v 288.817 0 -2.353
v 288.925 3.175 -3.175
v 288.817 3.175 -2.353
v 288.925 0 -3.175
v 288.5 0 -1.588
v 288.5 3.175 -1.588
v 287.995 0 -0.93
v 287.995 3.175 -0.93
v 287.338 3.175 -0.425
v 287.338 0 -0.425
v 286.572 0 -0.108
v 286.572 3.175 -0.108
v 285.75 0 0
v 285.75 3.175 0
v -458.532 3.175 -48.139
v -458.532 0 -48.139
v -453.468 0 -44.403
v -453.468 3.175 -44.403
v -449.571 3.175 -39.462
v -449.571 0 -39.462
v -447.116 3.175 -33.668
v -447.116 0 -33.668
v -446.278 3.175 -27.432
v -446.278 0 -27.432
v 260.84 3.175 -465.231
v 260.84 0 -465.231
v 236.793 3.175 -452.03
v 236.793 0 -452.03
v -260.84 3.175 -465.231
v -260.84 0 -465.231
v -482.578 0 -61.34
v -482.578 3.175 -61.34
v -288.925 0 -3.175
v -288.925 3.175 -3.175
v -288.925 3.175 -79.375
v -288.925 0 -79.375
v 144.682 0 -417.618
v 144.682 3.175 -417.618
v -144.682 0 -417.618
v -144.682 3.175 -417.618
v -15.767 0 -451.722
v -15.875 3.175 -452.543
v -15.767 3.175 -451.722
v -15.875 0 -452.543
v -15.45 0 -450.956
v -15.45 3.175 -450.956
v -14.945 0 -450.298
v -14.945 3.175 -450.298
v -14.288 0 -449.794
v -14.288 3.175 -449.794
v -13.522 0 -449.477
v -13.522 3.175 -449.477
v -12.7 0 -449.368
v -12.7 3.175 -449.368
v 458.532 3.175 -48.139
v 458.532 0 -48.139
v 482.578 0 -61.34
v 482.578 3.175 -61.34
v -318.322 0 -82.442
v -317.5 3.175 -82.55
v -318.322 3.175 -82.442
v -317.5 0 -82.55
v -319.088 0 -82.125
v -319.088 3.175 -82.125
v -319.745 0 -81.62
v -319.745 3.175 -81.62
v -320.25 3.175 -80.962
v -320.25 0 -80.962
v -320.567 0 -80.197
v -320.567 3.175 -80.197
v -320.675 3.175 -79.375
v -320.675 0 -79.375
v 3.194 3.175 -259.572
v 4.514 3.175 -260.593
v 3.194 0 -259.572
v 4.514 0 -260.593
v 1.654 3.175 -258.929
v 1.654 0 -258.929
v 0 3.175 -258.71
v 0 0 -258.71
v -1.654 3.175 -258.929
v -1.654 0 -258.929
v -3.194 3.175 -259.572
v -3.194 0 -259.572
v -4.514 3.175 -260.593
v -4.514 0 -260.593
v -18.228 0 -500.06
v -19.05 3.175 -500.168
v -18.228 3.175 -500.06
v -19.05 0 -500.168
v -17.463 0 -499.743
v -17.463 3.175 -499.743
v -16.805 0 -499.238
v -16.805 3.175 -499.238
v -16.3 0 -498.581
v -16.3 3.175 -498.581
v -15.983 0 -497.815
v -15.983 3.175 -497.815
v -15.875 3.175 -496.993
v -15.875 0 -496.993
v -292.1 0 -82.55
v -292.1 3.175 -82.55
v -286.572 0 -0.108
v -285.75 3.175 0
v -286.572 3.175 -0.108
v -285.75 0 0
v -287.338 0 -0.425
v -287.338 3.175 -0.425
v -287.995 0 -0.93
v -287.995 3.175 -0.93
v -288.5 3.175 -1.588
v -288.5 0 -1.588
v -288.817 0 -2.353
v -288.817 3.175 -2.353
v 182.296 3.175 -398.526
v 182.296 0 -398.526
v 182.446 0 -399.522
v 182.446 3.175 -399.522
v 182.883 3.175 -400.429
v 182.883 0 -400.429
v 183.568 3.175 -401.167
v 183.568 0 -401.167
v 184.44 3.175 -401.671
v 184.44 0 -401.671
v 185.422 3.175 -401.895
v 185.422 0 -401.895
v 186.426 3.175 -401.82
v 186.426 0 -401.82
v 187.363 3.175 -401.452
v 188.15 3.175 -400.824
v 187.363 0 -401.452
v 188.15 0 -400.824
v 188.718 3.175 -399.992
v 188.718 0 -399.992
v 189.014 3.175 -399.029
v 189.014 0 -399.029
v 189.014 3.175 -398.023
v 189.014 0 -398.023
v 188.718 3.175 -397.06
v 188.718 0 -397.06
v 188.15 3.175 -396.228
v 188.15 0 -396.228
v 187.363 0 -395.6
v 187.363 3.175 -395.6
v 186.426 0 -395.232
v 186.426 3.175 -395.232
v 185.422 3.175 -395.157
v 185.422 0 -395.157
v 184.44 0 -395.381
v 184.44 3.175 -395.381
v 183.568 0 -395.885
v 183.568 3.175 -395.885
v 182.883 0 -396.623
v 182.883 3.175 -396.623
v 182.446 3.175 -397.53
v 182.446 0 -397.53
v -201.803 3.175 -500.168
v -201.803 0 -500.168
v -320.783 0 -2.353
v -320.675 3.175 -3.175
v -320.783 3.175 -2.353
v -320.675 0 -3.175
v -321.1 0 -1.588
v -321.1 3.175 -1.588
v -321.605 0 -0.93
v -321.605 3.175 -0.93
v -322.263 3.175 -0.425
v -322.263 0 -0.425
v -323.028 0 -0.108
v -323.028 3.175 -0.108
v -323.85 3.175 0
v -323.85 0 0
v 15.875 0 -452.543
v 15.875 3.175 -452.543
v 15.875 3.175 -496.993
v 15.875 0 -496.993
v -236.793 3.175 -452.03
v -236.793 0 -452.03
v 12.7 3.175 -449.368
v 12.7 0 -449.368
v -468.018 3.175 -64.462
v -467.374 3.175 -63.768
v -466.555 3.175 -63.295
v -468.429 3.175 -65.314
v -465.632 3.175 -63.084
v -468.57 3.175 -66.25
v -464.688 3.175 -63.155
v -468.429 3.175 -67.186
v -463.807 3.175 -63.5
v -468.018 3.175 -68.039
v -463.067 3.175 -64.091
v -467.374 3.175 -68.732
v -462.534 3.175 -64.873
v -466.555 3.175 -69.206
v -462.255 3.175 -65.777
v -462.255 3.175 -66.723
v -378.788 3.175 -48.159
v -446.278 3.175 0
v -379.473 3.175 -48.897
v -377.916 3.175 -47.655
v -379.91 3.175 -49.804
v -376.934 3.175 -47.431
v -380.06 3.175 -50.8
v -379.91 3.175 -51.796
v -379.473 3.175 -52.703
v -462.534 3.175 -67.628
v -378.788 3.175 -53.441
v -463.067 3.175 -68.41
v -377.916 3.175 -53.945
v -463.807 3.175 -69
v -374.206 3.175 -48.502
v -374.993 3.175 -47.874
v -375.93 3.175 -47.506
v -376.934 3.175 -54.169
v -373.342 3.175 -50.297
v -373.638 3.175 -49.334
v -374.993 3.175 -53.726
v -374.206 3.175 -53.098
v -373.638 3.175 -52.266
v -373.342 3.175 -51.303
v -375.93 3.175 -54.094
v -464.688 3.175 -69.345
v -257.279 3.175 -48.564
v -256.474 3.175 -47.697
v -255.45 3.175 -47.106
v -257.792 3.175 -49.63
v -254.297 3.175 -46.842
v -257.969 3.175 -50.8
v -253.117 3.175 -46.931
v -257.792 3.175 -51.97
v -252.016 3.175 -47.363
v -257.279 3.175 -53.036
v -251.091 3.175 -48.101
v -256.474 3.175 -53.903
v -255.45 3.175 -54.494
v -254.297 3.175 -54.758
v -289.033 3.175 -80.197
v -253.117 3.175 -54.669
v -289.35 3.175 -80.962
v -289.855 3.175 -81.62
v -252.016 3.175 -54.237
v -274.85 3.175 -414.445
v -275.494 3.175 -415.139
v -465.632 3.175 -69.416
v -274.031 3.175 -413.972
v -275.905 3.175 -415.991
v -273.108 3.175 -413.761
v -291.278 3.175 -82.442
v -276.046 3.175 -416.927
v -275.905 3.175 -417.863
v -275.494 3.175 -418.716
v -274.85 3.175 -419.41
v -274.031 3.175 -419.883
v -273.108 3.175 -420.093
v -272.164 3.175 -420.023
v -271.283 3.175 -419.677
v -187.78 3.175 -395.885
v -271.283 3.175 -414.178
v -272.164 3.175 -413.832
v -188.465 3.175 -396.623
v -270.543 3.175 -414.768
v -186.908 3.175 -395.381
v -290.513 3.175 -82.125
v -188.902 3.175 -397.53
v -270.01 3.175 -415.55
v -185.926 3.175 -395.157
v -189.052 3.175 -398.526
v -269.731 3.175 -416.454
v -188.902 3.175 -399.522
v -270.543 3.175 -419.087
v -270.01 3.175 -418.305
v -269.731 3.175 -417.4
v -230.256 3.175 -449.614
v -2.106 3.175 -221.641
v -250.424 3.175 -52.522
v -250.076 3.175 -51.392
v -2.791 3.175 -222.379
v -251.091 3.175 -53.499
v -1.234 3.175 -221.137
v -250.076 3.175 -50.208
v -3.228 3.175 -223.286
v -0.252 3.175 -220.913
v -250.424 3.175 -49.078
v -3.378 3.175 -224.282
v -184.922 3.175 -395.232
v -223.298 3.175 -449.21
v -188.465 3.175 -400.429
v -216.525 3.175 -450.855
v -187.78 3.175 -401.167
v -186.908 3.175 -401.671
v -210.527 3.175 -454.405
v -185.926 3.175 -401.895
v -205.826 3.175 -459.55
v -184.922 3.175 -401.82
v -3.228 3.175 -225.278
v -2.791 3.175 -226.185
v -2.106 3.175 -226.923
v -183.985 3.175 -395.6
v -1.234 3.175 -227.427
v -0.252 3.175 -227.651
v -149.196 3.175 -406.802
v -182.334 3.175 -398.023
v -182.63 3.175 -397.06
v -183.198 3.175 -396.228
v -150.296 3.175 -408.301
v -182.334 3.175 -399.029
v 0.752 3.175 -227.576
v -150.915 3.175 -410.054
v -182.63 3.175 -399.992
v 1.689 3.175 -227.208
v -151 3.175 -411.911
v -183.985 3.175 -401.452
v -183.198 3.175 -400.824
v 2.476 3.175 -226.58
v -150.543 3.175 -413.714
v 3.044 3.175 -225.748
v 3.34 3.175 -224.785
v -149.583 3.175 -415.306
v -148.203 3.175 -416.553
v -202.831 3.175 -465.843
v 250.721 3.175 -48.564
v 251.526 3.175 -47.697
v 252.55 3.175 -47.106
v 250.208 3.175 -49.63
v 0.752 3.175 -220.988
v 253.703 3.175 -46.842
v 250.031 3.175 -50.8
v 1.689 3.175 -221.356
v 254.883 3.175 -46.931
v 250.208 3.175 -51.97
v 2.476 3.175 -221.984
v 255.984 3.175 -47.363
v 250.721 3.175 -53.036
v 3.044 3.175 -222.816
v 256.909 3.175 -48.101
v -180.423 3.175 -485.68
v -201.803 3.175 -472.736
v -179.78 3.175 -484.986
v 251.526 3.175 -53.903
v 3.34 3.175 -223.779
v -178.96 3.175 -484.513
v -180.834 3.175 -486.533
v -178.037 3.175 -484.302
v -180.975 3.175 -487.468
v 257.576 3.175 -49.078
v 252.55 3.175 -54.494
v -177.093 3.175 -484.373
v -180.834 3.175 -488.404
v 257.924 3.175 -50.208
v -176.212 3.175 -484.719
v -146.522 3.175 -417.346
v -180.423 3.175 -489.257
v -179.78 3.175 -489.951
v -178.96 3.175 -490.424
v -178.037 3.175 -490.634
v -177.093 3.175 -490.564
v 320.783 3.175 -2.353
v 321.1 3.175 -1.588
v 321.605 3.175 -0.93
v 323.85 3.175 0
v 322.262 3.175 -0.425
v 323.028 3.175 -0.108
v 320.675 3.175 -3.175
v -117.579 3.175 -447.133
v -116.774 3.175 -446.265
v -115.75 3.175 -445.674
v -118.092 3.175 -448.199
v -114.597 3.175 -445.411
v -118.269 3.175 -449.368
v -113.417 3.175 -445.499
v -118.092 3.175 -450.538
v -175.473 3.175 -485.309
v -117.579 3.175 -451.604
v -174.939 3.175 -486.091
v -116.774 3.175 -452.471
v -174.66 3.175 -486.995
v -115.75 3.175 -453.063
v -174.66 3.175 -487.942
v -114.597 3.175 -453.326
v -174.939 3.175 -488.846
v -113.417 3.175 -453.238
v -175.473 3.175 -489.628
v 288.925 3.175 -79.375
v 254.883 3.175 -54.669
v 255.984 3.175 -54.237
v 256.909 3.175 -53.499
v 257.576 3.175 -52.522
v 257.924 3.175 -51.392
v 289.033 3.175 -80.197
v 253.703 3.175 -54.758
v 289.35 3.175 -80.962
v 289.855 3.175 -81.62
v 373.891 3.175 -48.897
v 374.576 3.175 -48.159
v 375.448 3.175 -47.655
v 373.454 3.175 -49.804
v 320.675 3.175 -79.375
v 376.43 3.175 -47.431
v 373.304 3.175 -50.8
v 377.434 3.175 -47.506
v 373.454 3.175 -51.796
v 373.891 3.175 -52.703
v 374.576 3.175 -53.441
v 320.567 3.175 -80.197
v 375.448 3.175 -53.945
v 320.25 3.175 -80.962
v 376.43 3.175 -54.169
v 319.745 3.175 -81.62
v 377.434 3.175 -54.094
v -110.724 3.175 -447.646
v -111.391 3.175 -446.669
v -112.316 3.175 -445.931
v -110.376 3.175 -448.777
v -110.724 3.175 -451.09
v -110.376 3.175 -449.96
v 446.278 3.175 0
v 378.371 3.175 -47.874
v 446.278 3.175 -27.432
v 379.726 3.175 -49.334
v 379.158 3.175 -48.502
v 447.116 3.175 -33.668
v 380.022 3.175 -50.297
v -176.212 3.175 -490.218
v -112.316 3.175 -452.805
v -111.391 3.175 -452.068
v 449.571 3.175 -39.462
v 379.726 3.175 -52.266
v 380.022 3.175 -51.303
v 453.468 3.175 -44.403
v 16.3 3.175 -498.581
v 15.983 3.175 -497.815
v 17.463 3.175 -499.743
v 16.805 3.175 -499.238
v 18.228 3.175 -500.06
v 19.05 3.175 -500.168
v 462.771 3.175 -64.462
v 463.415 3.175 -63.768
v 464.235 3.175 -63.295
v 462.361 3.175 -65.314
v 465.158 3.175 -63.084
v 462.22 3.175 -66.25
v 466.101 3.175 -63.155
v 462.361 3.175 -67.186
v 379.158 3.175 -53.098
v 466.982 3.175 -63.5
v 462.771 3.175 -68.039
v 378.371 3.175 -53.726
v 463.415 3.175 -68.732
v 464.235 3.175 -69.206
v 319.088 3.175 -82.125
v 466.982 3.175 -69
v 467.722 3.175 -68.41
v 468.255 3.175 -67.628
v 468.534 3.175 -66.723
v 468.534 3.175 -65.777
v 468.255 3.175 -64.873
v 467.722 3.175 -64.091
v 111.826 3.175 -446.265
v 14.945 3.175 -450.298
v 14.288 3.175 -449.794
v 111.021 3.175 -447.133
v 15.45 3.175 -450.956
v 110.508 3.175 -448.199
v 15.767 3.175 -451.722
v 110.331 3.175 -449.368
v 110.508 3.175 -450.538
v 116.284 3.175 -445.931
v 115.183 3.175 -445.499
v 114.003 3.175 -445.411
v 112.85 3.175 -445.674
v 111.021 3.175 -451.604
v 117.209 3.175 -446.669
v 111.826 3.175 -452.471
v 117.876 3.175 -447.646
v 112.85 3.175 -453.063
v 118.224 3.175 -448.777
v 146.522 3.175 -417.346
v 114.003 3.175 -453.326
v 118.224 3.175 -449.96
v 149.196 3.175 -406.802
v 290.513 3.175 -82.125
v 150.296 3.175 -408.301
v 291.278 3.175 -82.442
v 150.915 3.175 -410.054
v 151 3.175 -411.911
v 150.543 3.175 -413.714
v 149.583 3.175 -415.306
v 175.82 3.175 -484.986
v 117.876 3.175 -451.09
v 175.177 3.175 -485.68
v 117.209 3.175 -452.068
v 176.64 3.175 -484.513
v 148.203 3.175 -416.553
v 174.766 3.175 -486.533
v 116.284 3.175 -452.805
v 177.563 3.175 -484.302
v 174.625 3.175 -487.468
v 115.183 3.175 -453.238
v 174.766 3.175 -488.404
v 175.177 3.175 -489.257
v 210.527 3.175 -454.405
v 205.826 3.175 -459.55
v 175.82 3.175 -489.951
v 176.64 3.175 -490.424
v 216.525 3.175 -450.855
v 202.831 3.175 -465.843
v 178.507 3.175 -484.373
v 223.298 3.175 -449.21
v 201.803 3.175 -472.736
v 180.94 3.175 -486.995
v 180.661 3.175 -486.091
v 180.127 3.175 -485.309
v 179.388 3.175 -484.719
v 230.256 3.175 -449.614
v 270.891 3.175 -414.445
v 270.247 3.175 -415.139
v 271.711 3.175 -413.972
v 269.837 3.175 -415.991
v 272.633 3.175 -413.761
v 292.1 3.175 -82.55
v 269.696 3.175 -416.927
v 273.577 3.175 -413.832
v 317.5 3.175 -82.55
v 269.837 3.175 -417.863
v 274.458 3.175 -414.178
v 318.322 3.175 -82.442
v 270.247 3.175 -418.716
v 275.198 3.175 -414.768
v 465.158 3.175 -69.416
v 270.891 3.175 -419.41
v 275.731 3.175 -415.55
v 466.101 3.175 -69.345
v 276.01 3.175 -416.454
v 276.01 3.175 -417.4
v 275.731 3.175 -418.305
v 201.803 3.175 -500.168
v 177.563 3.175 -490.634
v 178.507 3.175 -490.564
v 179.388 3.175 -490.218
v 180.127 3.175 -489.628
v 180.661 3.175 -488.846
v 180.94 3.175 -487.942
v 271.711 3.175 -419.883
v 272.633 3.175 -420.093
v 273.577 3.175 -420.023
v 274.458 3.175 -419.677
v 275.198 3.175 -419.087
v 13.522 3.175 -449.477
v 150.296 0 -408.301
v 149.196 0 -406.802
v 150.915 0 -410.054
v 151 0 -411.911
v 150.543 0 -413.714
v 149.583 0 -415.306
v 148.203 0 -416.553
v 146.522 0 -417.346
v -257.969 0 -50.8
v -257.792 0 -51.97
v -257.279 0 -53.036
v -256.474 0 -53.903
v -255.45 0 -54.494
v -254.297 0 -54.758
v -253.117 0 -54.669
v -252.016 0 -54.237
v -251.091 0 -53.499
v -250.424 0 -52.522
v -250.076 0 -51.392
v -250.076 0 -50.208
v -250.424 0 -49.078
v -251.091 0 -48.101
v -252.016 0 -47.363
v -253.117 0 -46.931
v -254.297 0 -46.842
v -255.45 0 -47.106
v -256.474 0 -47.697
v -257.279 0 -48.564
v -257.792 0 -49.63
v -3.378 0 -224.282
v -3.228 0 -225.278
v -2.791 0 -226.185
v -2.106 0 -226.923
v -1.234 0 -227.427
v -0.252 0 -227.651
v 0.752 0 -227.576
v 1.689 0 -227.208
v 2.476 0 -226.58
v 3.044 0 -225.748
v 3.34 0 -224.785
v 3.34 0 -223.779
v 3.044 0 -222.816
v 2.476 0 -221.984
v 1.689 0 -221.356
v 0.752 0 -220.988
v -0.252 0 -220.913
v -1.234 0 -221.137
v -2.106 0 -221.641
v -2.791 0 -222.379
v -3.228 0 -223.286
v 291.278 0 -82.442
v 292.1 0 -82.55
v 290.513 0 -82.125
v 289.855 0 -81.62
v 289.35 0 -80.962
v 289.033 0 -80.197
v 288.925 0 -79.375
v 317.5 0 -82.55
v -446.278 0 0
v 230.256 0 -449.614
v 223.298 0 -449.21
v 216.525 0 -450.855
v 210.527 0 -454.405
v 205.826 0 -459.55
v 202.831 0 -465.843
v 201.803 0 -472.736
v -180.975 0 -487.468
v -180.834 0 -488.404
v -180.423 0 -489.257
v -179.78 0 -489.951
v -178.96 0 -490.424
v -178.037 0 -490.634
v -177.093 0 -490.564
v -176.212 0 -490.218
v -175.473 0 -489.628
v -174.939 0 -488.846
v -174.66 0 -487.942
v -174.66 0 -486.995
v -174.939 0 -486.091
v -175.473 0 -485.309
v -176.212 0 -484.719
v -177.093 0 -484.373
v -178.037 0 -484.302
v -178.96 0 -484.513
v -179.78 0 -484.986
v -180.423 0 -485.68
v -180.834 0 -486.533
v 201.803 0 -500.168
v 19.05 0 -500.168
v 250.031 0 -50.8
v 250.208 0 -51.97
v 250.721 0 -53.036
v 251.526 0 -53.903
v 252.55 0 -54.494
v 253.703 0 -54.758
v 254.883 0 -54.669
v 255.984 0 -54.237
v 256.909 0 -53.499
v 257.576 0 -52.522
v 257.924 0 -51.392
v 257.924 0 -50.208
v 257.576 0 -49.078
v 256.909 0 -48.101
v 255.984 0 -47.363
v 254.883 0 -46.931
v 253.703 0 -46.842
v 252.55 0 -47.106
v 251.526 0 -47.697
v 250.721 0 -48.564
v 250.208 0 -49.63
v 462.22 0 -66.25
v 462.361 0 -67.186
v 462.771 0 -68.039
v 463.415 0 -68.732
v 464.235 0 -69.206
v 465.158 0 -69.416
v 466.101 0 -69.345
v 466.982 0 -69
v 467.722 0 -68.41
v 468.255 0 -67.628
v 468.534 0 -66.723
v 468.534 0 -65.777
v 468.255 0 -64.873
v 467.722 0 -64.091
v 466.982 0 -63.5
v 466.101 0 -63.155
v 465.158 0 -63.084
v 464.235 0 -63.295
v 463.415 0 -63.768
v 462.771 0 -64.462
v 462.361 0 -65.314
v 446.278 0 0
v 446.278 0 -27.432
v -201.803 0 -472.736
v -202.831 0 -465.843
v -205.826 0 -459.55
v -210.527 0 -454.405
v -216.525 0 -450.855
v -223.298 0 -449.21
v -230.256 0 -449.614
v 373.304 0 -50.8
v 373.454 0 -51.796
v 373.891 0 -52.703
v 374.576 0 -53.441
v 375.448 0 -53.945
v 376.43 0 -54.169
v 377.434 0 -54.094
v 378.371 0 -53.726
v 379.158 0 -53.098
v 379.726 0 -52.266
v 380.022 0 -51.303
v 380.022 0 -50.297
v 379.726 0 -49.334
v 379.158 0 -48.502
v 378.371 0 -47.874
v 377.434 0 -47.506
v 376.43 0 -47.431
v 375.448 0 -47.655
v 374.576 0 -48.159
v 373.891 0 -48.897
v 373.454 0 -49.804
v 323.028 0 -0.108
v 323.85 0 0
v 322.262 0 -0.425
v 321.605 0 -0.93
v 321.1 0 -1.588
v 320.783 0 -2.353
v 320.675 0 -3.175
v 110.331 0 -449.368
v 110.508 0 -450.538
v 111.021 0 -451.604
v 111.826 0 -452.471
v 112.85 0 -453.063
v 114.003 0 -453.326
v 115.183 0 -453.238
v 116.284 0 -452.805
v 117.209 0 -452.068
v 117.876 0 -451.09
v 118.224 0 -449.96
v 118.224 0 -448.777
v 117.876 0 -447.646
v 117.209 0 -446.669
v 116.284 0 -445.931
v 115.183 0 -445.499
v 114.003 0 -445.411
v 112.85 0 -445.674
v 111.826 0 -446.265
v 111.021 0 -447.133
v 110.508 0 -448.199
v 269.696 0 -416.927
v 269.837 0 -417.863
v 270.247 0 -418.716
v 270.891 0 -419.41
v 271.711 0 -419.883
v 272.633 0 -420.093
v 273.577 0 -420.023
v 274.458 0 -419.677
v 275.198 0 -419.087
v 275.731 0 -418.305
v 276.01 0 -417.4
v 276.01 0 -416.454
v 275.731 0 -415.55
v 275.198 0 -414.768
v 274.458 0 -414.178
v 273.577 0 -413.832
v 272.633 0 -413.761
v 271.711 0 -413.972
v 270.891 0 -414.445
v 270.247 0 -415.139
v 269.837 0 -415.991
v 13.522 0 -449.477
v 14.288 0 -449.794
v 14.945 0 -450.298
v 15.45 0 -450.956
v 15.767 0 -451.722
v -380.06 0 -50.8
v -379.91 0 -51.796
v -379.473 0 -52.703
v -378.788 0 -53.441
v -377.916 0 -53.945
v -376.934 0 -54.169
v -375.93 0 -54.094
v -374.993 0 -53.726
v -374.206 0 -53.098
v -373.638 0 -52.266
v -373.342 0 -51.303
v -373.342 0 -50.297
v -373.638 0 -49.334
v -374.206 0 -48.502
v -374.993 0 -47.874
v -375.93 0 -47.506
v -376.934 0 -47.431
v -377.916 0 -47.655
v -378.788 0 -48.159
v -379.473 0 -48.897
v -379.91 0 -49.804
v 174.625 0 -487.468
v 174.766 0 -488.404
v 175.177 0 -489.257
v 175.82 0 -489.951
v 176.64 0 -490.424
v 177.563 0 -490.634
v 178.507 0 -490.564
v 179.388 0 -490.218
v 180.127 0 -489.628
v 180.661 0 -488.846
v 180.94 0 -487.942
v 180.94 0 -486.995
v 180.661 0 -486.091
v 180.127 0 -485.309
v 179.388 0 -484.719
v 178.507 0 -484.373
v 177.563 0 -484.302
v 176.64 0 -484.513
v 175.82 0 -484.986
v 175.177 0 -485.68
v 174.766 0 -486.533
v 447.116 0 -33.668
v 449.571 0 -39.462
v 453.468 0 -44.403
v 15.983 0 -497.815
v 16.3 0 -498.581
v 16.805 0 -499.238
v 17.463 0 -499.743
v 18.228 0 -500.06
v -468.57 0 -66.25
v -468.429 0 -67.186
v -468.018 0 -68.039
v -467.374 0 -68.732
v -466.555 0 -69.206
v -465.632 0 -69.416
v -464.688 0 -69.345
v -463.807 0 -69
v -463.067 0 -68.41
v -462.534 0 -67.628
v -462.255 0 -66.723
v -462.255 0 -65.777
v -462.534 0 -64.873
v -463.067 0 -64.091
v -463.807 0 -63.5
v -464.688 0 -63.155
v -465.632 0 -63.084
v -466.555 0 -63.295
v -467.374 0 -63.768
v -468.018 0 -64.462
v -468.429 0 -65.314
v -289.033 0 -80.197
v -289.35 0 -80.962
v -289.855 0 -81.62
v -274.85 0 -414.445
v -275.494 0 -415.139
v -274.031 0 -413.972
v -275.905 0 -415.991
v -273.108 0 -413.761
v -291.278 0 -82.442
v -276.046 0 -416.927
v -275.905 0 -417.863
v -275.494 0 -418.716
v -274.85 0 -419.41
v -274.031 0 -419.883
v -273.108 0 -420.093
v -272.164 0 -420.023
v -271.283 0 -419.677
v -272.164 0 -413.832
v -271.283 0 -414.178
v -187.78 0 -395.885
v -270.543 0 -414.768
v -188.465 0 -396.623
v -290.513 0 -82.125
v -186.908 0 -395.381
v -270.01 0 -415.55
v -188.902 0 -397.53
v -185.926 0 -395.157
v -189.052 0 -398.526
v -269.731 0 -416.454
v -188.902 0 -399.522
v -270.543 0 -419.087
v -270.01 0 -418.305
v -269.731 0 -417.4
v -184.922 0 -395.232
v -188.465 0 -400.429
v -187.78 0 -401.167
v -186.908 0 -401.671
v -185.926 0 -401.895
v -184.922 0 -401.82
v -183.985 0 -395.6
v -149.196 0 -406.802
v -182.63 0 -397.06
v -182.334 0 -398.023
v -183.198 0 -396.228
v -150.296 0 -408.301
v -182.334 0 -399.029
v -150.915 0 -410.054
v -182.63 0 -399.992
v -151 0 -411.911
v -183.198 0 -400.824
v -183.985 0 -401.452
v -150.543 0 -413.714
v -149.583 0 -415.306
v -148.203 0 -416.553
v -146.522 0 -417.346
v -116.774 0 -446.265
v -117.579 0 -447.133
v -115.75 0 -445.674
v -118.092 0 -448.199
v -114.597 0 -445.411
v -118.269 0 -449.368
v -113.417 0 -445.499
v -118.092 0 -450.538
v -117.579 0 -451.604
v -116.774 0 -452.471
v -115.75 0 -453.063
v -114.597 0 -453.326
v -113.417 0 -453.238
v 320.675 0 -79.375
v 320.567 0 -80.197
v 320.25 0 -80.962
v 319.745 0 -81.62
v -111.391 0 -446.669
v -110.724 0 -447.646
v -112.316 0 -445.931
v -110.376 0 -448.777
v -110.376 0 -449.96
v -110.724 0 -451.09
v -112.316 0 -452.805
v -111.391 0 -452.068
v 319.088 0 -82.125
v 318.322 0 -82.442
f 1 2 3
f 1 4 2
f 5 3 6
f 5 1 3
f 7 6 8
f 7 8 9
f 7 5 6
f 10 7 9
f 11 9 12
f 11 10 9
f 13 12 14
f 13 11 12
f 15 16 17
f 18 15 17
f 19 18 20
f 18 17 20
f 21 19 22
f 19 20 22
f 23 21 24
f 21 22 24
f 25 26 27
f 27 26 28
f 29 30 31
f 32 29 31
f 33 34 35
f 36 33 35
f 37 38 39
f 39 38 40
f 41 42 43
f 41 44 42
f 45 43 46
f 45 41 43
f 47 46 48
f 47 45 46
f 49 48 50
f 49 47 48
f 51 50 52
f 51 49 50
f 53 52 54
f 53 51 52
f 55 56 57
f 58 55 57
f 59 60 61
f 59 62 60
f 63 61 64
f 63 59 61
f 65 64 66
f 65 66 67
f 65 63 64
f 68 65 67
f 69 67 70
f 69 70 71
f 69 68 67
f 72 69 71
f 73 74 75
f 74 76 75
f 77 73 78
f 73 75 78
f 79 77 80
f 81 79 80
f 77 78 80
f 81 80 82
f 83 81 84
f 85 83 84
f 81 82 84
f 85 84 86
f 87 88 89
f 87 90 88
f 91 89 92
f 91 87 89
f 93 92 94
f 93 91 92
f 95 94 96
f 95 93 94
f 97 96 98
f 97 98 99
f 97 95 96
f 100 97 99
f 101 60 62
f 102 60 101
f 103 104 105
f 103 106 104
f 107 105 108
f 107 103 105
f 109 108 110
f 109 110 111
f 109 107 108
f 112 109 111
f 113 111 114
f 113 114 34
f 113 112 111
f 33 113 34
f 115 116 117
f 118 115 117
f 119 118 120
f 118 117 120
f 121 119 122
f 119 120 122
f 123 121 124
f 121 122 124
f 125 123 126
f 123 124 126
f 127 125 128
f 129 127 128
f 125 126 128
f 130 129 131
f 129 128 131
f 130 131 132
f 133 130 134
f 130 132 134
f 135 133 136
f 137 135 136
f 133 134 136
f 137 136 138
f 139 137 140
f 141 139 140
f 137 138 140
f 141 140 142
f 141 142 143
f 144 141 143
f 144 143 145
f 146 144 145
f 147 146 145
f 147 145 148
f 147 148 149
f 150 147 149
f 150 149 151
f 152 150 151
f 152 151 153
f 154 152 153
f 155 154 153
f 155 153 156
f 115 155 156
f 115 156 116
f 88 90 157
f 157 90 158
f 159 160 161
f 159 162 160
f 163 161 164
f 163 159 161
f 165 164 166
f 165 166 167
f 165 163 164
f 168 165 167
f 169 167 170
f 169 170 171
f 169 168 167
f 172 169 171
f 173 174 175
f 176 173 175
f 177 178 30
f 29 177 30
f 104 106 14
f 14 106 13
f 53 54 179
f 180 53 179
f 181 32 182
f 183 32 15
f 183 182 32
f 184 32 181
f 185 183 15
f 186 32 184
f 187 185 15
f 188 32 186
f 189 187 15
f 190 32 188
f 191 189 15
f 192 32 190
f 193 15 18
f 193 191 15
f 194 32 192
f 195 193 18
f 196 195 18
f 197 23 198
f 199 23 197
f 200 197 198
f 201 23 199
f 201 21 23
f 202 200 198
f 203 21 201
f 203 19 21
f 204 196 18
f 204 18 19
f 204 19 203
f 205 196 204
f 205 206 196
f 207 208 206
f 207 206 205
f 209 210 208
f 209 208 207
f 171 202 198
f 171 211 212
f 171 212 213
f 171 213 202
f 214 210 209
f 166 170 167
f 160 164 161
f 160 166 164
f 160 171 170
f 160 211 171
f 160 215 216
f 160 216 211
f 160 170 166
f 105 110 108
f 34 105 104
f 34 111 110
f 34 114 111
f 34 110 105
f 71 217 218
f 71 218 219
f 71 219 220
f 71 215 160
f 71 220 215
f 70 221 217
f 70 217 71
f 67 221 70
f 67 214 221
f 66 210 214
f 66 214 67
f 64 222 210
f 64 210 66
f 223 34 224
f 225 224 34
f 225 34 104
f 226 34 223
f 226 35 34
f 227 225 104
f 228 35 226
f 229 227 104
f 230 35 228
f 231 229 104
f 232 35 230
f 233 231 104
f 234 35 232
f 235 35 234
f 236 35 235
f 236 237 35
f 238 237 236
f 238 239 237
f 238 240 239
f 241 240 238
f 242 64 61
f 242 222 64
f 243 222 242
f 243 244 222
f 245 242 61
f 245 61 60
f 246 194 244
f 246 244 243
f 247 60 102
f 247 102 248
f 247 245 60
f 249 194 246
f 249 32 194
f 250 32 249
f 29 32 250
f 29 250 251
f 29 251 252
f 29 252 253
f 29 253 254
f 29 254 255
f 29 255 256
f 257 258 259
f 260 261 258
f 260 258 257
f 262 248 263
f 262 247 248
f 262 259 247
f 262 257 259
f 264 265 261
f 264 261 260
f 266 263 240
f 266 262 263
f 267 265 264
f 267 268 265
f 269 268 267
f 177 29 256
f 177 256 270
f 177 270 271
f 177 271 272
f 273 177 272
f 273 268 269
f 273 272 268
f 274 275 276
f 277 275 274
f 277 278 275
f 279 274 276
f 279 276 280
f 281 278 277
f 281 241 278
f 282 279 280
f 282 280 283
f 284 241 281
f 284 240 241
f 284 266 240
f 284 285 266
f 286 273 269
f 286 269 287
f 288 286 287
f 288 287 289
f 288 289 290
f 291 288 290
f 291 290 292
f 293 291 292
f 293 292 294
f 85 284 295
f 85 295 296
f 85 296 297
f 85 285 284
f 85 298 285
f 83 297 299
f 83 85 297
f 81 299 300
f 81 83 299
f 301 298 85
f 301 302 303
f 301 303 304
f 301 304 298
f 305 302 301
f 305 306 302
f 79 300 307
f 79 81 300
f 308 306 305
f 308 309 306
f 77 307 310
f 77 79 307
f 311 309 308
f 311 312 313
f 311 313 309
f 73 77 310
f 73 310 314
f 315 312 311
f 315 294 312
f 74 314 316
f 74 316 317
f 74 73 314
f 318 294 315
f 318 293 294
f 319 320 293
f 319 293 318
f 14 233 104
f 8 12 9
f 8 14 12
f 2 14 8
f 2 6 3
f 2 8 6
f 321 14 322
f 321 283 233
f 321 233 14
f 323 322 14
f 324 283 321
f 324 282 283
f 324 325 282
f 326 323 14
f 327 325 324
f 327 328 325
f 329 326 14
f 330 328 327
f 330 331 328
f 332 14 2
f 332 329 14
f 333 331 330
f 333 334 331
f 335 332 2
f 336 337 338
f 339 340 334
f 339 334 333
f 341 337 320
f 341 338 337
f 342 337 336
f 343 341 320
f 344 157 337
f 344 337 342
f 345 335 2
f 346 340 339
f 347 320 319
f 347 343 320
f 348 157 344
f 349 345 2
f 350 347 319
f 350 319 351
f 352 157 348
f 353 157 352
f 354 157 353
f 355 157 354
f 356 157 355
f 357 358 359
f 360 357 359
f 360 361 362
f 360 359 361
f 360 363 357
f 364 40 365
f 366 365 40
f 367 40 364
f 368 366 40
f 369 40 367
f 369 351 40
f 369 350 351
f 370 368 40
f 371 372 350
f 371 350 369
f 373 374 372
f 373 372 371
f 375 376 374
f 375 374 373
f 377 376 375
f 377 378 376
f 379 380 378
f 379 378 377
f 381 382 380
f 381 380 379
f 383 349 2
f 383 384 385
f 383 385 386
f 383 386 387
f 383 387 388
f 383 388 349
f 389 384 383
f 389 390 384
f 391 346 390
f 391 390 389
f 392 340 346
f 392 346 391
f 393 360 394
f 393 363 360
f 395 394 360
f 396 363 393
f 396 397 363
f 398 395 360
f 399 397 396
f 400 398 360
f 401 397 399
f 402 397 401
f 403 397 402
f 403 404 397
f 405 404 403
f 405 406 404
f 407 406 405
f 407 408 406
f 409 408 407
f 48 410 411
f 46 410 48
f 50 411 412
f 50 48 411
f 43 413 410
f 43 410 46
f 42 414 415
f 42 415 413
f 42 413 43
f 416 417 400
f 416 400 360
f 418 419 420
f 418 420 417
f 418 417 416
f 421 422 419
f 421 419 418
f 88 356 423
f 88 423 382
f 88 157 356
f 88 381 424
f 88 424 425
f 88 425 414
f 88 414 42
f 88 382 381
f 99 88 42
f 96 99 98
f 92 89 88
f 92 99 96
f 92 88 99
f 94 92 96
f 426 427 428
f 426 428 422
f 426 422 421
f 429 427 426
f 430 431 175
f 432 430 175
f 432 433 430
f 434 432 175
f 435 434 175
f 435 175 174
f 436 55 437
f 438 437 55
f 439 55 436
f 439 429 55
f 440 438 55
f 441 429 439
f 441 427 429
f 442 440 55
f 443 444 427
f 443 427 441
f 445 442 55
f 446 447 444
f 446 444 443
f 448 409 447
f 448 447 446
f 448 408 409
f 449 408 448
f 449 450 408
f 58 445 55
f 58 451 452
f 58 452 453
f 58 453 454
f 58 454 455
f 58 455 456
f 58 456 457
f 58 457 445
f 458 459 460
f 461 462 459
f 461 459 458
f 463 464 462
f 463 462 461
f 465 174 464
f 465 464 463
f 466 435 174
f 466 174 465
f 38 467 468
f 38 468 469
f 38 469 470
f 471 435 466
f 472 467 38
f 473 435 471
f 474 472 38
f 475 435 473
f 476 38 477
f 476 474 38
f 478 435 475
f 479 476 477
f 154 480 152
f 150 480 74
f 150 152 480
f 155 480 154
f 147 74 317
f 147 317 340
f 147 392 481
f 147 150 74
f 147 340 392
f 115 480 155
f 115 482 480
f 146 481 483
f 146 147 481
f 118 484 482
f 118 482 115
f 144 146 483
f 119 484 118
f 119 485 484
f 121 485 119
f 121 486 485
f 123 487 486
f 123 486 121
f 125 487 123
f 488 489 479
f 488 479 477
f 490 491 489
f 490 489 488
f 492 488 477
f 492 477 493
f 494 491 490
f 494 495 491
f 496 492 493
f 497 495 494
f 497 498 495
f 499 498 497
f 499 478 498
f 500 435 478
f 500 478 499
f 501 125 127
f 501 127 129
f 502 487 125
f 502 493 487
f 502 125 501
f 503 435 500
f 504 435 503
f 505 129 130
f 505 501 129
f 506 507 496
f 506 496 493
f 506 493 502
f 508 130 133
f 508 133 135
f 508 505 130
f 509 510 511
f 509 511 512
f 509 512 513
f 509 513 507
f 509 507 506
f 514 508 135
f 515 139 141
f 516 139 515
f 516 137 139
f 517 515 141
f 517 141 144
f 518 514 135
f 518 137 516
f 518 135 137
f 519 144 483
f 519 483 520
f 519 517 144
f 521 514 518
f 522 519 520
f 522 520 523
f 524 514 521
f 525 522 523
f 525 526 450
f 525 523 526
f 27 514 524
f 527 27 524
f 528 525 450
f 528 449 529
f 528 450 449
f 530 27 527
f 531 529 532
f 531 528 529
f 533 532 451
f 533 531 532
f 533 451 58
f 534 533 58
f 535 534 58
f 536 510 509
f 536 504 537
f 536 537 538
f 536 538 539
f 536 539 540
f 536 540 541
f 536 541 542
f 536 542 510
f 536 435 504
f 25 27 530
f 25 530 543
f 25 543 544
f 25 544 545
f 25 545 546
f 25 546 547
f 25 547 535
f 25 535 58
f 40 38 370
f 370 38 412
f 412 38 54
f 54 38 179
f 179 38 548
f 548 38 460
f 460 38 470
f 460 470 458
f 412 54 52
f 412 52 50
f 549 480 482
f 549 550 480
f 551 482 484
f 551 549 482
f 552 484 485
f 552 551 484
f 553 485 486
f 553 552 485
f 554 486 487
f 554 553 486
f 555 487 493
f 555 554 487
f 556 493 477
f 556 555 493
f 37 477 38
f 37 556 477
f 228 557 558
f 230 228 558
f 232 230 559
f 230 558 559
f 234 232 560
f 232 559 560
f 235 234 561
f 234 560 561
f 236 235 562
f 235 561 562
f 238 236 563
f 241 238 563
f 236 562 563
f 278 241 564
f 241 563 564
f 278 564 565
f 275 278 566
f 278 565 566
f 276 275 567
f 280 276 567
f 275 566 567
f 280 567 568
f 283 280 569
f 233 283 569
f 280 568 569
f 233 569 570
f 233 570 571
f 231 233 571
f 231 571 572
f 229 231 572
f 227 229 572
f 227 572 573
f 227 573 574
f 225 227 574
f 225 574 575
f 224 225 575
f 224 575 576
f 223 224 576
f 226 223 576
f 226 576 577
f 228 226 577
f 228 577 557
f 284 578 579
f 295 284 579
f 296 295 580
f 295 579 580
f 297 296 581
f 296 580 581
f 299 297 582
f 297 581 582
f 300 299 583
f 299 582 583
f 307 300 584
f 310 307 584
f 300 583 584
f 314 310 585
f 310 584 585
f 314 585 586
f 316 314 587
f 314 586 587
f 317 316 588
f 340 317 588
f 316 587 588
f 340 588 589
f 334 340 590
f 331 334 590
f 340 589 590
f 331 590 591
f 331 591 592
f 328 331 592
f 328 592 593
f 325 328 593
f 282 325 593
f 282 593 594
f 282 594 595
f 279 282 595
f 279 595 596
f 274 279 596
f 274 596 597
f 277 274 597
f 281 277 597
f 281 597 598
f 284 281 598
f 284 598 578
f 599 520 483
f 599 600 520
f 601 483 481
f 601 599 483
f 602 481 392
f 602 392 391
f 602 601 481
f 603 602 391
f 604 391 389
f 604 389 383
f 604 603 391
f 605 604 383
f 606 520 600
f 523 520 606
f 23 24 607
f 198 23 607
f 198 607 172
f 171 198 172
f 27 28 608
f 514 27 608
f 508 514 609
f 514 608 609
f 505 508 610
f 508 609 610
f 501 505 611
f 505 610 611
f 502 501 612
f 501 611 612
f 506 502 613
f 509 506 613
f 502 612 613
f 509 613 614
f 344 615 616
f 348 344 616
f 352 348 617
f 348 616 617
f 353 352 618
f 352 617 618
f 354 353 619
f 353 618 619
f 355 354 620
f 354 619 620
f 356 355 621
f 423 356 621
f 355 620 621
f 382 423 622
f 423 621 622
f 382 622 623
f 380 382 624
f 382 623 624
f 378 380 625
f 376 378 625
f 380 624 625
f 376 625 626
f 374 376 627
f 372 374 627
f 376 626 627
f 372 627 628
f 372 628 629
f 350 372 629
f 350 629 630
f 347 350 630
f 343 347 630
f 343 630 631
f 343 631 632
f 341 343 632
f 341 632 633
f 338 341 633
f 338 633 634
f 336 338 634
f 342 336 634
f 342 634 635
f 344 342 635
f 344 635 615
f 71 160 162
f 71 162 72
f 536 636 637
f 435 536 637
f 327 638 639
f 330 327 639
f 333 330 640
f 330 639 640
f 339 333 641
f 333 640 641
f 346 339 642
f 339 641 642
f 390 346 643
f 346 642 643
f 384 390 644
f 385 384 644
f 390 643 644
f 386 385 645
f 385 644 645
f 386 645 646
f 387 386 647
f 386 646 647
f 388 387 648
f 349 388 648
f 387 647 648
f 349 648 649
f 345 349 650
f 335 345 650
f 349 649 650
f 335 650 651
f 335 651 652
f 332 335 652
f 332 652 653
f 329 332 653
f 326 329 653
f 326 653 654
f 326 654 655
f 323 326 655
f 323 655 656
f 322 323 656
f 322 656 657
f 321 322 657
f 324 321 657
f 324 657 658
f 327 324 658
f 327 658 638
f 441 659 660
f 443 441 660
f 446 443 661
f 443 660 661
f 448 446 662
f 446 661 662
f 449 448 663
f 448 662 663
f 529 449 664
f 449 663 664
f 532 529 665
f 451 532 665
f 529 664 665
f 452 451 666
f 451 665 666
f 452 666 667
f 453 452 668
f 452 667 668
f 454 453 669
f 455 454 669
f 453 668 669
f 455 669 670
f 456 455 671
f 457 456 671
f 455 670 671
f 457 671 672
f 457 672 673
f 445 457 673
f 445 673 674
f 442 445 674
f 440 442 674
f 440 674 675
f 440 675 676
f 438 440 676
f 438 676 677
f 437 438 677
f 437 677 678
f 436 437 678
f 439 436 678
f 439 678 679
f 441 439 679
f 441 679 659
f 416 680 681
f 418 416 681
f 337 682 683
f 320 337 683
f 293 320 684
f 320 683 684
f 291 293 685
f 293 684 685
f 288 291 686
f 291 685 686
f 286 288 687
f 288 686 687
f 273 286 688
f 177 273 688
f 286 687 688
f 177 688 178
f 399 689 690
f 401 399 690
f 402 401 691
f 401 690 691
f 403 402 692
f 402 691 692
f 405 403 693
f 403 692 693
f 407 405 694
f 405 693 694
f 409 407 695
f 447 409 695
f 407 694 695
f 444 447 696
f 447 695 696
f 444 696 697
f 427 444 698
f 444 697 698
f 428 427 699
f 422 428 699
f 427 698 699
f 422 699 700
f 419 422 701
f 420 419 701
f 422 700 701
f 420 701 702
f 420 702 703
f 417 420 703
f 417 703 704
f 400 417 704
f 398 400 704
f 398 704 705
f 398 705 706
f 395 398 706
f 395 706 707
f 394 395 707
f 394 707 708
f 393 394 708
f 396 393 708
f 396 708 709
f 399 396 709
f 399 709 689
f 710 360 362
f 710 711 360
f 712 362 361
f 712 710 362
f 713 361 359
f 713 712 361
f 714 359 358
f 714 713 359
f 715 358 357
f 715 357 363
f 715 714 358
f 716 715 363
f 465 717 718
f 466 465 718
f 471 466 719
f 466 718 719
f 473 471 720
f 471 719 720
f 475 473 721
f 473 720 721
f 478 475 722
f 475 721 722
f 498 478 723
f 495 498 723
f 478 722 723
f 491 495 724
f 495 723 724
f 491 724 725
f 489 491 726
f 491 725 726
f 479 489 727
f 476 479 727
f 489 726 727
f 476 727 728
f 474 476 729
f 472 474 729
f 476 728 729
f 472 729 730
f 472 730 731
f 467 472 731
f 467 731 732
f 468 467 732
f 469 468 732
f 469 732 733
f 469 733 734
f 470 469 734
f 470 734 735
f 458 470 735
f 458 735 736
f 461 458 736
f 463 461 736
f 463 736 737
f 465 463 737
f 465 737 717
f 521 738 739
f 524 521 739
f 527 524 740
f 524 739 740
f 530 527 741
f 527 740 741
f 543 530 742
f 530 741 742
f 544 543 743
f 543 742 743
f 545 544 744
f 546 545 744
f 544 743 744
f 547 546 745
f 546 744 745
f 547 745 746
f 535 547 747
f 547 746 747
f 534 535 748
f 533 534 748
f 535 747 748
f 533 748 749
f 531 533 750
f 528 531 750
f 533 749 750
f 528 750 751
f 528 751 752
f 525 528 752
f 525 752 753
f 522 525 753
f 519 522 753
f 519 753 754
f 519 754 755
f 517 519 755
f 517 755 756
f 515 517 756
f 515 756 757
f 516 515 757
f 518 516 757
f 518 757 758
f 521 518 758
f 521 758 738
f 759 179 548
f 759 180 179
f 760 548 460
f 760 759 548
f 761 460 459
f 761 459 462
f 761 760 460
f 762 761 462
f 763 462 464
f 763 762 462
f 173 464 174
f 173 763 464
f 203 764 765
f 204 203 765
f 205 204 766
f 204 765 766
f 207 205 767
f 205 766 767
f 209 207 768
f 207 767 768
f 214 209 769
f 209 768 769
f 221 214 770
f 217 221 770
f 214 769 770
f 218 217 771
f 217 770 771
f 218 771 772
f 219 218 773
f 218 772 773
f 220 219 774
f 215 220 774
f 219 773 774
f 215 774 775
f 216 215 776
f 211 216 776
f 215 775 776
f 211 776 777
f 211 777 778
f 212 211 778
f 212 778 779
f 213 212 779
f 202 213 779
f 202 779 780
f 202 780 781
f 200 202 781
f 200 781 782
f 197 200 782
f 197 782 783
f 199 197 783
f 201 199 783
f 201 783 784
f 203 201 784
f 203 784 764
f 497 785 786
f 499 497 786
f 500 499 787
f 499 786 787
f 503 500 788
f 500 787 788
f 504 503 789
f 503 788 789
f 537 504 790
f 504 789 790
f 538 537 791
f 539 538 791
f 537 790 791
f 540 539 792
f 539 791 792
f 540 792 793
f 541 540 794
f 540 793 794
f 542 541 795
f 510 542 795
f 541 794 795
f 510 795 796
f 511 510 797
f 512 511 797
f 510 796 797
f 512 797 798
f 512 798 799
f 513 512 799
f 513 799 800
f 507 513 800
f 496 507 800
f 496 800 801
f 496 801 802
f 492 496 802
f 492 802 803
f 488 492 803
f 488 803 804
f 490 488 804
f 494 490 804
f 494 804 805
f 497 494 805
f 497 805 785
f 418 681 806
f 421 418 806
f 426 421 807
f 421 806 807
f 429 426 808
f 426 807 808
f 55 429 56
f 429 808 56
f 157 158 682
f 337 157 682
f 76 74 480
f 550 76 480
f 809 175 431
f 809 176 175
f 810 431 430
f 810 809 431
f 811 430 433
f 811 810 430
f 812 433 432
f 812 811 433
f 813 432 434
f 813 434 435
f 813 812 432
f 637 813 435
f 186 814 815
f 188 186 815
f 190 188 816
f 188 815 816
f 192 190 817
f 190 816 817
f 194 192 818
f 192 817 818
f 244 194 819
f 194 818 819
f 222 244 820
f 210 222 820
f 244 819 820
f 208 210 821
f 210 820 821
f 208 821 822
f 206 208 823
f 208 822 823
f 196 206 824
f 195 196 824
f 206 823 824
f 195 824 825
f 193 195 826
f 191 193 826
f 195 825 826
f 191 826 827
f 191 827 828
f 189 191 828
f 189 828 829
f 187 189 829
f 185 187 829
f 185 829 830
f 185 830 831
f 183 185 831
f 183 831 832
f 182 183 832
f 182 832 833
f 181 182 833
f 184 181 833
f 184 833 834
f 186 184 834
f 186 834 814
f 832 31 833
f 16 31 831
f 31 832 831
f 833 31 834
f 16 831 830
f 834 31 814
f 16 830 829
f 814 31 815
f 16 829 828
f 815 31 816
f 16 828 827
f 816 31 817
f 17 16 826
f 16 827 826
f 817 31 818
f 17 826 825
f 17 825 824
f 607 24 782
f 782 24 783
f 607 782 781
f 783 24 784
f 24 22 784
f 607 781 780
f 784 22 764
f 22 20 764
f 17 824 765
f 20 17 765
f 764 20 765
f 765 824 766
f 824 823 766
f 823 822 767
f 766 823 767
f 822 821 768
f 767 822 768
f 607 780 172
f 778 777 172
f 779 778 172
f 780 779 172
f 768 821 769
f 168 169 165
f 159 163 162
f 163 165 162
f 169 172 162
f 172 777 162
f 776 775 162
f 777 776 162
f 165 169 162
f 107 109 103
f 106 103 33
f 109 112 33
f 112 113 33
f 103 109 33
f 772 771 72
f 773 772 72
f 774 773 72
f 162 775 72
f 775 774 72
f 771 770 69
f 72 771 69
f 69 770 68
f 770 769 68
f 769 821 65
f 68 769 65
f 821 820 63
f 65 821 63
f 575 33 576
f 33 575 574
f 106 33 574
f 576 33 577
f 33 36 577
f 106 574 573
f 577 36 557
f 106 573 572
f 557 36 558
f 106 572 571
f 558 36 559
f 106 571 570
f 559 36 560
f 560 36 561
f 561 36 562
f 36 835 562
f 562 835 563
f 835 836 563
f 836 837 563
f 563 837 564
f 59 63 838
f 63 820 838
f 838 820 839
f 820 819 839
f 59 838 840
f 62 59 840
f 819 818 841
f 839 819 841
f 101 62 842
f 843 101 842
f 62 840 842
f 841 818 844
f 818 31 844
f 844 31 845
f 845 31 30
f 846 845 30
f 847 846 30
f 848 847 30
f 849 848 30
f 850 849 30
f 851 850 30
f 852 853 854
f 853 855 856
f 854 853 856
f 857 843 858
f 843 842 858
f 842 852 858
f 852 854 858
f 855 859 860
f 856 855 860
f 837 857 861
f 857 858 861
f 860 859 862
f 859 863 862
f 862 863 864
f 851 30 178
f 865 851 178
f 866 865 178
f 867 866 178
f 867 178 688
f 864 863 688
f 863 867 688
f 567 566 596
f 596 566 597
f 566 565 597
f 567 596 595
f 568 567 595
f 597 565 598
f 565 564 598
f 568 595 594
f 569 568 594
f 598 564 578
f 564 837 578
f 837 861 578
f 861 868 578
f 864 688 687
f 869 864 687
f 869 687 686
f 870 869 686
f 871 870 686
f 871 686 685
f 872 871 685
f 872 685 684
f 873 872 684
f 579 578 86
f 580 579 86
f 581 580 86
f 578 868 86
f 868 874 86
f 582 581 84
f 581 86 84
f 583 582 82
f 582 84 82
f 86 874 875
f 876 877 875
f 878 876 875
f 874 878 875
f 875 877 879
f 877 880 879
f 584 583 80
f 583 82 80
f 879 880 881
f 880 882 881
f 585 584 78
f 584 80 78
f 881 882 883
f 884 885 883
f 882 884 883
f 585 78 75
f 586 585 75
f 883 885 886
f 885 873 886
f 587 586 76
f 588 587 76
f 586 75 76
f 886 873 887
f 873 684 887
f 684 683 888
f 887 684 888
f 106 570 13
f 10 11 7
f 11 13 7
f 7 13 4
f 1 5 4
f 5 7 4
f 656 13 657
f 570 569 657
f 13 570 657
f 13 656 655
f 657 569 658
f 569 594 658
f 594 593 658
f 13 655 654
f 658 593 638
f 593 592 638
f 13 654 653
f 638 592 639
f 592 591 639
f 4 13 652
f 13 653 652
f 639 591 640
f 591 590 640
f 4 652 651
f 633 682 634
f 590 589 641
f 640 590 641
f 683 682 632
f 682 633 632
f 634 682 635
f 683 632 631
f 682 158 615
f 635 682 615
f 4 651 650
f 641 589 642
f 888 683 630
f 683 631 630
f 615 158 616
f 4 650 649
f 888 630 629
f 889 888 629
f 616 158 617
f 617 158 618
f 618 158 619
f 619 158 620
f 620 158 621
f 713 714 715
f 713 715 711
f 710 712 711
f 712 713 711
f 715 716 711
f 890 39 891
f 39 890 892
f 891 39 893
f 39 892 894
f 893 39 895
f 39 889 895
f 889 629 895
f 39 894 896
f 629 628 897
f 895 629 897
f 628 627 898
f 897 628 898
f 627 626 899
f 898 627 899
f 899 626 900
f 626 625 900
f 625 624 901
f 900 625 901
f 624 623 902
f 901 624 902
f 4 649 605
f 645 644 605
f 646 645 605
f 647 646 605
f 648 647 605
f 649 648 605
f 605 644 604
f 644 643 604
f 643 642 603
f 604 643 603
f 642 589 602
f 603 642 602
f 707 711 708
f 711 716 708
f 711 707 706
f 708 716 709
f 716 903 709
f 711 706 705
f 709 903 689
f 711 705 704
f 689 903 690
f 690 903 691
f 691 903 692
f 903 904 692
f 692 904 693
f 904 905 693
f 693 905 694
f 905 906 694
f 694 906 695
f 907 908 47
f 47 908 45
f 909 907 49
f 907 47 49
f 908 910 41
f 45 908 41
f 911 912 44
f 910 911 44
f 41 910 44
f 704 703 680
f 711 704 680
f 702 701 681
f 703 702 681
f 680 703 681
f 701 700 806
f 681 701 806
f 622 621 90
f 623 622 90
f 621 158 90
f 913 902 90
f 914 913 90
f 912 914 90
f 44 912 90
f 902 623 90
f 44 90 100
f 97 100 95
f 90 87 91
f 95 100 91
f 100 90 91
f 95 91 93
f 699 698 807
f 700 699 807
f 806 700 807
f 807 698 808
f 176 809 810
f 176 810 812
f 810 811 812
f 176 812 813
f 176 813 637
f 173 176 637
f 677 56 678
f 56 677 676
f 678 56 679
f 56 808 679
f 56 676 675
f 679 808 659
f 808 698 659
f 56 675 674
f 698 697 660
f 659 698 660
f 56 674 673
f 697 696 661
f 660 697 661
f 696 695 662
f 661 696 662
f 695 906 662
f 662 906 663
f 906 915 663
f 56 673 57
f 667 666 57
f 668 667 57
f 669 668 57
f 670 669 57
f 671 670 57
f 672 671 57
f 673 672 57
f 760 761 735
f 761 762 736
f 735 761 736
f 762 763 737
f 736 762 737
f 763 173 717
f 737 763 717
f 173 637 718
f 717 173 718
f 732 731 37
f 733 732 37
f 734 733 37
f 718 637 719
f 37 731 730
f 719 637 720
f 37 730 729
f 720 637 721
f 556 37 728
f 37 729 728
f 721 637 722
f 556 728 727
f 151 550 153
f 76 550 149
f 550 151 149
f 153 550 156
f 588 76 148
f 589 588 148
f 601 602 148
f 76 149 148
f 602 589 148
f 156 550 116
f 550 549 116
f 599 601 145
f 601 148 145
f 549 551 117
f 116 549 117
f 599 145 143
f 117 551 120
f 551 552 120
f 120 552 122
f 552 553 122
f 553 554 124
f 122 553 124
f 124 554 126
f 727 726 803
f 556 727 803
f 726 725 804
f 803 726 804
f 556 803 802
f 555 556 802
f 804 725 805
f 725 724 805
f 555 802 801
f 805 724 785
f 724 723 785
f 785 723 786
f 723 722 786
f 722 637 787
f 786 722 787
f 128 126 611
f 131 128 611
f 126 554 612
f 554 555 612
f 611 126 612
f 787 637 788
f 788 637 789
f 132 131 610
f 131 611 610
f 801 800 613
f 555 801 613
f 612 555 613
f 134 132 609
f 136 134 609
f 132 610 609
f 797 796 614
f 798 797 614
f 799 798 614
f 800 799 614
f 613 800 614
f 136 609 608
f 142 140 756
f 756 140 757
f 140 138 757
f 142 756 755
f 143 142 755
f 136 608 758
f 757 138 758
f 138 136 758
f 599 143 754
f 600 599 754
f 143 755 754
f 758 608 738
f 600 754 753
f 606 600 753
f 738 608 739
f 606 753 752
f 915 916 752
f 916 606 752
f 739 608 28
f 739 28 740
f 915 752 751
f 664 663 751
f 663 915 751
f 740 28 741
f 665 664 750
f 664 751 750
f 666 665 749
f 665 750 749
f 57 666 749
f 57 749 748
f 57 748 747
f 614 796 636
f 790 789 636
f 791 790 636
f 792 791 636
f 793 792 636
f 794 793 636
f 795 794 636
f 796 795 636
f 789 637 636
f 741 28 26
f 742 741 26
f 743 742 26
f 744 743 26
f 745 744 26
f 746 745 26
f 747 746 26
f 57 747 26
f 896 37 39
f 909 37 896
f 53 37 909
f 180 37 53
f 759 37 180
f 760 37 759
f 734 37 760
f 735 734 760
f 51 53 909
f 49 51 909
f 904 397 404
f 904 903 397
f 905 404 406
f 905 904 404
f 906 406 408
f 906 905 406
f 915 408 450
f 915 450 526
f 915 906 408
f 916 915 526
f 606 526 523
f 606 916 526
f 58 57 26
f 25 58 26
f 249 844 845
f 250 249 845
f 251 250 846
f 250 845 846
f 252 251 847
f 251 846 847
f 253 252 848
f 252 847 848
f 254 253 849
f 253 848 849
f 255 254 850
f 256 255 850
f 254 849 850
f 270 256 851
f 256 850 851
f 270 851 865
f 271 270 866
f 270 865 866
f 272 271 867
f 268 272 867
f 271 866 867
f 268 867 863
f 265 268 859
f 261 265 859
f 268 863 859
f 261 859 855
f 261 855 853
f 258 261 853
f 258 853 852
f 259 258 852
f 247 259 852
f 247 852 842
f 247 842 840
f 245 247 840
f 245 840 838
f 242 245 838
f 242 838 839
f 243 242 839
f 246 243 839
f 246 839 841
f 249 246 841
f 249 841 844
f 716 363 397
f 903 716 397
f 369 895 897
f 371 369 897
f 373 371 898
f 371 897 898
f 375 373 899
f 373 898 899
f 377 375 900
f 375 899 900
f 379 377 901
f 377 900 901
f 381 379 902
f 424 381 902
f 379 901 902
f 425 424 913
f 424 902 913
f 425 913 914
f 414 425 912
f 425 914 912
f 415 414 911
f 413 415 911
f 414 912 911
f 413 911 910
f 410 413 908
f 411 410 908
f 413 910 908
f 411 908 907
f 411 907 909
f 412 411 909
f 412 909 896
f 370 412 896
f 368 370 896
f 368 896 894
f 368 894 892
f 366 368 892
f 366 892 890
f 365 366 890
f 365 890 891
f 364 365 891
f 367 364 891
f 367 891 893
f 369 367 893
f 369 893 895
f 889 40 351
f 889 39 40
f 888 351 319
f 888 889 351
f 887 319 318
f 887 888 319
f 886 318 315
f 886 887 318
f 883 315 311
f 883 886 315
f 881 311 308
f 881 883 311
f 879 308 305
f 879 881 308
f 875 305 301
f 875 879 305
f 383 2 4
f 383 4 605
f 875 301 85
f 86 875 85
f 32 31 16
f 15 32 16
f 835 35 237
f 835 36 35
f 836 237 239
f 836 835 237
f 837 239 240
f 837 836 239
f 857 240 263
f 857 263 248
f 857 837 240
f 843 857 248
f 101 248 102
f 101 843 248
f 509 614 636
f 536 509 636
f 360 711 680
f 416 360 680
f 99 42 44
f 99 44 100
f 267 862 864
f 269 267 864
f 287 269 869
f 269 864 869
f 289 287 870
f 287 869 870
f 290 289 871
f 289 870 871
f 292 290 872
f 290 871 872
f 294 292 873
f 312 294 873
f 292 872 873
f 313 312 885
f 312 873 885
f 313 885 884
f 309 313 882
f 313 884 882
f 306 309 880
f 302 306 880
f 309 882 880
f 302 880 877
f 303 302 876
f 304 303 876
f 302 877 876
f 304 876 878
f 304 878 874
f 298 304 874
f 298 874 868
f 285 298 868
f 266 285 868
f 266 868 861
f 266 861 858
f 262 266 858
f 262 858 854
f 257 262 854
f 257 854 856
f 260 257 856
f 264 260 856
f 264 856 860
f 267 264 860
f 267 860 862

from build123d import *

# Parameters (mm, degrees)
BOSS_EXTRUDE1_DEPTH            = 3.175
SKETCH2_W                      = 31.75
SKETCH2_H                      = 82.55
CUT_EXTRUDE1_DEPTH             = 4.175
FILLET1_R                      = 3.175
F_1_4_0_25_DIAMETER_HOLE1_D    = 6.35
F_1_4_CLEARANCE_HOLE1_D        = 6.7564
F_5_16_0_3125_DIAMETER_HOLE1_D = 7.9375
CUT_EXTRUDE2_DEPTH             = 4.175
FILLET2_R                      = 6.35
SKETCH12_W                     = 31.75
SKETCH12_H                     = 50.8
CUT_EXTRUDE3_DEPTH             = 4.175
FILLET3_R                      = 3.175


with BuildPart() as part:
    # Sketch1 → Boss-Extrude1 (new body)
    with BuildSketch(Plane(origin=(0, 0, 0), x_dir=(1, 0, 0), z_dir=(0, 1, 0))):
        with BuildLine():
            Line((-260.839523021, 465.231358695), (-482.578348021, 61.34030281))
            Line((-482.578348021, 61.34030281), (-458.5319125, 48.13865281))
            ThreePointArc((-458.5319125, 48.13865281), (-449.57100781, 39.462418136), (-446.278, 27.432))
            Line((-446.278, 27.432), (-446.278, 0))
            Line((-446.278, 0), (446.278, 0))
            Line((446.278, 0), (446.278, 27.432))
            ThreePointArc((446.278, 27.432), (449.57100781, 39.462418136), (458.5319125, 48.13865281))
            Line((458.5319125, 48.13865281), (482.578348021, 61.34030281))
            Line((482.578348021, 61.34030281), (260.839523021, 465.231358695))
            Line((260.839523021, 465.231358695), (236.7930875, 452.029708695))
            ThreePointArc((236.7930875, 452.029708695), (213.394581864, 452.407369315), (201.803, 472.736361505))
            Line((201.803, 472.736361505), (201.803, 500.168361505))
            Line((201.803, 500.168361505), (-201.803, 500.168361505))
            Line((-201.803, 500.168361505), (-201.803, 472.736361505))
            ThreePointArc((-201.803, 472.736361505), (-213.394581864, 452.407369315), (-236.7930875, 452.029708695))
            Line((-236.7930875, 452.029708695), (-260.839523021, 465.231358695))
        make_face()
    extrude(amount=BOSS_EXTRUDE1_DEPTH)

    # Sketch2 → Cut-Extrude1 (cut, through all)
    with BuildSketch(Plane(origin=(0, 3.175, 0), x_dir=(1, 0, 0), z_dir=(0, 1, 0))):
        with Locations((-304.8, 41.275)):
            Rectangle(SKETCH2_W, SKETCH2_H)
        with Locations((304.8, 41.275)):
            Rectangle(SKETCH2_W, SKETCH2_H)
    extrude(amount=-CUT_EXTRUDE1_DEPTH, mode=Mode.SUBTRACT)

    # Fillet1
    fillet1_edges = [part.edges().sort_by_distance(p)[0] for p in [
        (-288.925, 1.5875, -82.55),
        (-288.925, 1.5875, 0),
        (-320.675, 1.5875, 0),
        (-320.675, 1.5875, -82.55),
        (288.925, 1.5875, 0),
        (288.925, 1.5875, -82.55),
        (320.675, 1.5875, -82.55),
        (320.675, 1.5875, 0),
    ]]
    fillet(fillet1_edges, radius=FILLET1_R)

    # 1/4 (0.25) Diameter Hole1 (through all)
    with Locations(Plane(origin=(0, 3.175, 0), x_dir=(1, 0, 0), z_dir=(0, 1, 0))):
        with Locations((-465.394777961, 66.250083744), (-272.870715461, 416.927268429), (-177.8, 487.468361505), (465.394777961, 66.250083744), (272.870715461, 416.927268429), (177.8, 487.468361505)):
            Hole(F_1_4_0_25_DIAMETER_HOLE1_D / 2)

    # 1/4 Clearance Hole1 (through all)
    with Locations(Plane(origin=(0, 3.175, 0), x_dir=(1, 0, 0), z_dir=(0, 1, 0))):
        with Locations((0, 224.282), (-376.682, 50.8), (-185.674, 398.526), (376.682, 50.8), (185.674, 398.526)):
            Hole(F_1_4_CLEARANCE_HOLE1_D / 2)

    # 5/16 (0.3125) Diameter Hole1 (through all)
    with Locations(Plane(origin=(0, 3.175, 0), x_dir=(1, 0, 0), z_dir=(0, 1, 0))):
        with Locations((-254, 50.8), (-114.3, 449.368361505), (254, 50.8), (114.3, 449.368361505)):
            Hole(F_5_16_0_3125_DIAMETER_HOLE1_D / 2)

    # Sketch11 → Cut-Extrude2 (cut, through all)
    with BuildSketch(Plane(origin=(0, 3.175, 0), x_dir=(1, 0, 0), z_dir=(0, 1, 0))):
        Polygon((0, 256.032), (159.899523893, 417.618361505), (-159.899523893, 417.618361505), align=None)
    extrude(amount=-CUT_EXTRUDE2_DEPTH, mode=Mode.SUBTRACT)

    # Fillet2
    fillet2_edges = [part.edges().sort_by_distance(p)[0] for p in [
        (0, 1.5875, -256.032),
        (-159.899523893, 1.5875, -417.618361505),
        (159.899523893, 1.5875, -417.618361505),
    ]]
    fillet(fillet2_edges, radius=FILLET2_R)

    # Sketch12 → Cut-Extrude3 (cut, through all)
    with BuildSketch(Plane(origin=(0, 3.175, 0), x_dir=(1, 0, 0), z_dir=(0, 1, 0))):
        with Locations((0, 474.768361505)):
            Rectangle(SKETCH12_W, SKETCH12_H)
    extrude(amount=-CUT_EXTRUDE3_DEPTH, mode=Mode.SUBTRACT)

    # Fillet3
    fillet3_edges = [part.edges().sort_by_distance(p)[0] for p in [
        (-15.875, 1.5875, -449.368361505),
        (-15.875, 1.5875, -500.168361505),
        (15.875, 1.5875, -500.168361505),
        (15.875, 1.5875, -449.368361505),
    ]]
    fillet(fillet3_edges, radius=FILLET3_R)


solid = part.part
